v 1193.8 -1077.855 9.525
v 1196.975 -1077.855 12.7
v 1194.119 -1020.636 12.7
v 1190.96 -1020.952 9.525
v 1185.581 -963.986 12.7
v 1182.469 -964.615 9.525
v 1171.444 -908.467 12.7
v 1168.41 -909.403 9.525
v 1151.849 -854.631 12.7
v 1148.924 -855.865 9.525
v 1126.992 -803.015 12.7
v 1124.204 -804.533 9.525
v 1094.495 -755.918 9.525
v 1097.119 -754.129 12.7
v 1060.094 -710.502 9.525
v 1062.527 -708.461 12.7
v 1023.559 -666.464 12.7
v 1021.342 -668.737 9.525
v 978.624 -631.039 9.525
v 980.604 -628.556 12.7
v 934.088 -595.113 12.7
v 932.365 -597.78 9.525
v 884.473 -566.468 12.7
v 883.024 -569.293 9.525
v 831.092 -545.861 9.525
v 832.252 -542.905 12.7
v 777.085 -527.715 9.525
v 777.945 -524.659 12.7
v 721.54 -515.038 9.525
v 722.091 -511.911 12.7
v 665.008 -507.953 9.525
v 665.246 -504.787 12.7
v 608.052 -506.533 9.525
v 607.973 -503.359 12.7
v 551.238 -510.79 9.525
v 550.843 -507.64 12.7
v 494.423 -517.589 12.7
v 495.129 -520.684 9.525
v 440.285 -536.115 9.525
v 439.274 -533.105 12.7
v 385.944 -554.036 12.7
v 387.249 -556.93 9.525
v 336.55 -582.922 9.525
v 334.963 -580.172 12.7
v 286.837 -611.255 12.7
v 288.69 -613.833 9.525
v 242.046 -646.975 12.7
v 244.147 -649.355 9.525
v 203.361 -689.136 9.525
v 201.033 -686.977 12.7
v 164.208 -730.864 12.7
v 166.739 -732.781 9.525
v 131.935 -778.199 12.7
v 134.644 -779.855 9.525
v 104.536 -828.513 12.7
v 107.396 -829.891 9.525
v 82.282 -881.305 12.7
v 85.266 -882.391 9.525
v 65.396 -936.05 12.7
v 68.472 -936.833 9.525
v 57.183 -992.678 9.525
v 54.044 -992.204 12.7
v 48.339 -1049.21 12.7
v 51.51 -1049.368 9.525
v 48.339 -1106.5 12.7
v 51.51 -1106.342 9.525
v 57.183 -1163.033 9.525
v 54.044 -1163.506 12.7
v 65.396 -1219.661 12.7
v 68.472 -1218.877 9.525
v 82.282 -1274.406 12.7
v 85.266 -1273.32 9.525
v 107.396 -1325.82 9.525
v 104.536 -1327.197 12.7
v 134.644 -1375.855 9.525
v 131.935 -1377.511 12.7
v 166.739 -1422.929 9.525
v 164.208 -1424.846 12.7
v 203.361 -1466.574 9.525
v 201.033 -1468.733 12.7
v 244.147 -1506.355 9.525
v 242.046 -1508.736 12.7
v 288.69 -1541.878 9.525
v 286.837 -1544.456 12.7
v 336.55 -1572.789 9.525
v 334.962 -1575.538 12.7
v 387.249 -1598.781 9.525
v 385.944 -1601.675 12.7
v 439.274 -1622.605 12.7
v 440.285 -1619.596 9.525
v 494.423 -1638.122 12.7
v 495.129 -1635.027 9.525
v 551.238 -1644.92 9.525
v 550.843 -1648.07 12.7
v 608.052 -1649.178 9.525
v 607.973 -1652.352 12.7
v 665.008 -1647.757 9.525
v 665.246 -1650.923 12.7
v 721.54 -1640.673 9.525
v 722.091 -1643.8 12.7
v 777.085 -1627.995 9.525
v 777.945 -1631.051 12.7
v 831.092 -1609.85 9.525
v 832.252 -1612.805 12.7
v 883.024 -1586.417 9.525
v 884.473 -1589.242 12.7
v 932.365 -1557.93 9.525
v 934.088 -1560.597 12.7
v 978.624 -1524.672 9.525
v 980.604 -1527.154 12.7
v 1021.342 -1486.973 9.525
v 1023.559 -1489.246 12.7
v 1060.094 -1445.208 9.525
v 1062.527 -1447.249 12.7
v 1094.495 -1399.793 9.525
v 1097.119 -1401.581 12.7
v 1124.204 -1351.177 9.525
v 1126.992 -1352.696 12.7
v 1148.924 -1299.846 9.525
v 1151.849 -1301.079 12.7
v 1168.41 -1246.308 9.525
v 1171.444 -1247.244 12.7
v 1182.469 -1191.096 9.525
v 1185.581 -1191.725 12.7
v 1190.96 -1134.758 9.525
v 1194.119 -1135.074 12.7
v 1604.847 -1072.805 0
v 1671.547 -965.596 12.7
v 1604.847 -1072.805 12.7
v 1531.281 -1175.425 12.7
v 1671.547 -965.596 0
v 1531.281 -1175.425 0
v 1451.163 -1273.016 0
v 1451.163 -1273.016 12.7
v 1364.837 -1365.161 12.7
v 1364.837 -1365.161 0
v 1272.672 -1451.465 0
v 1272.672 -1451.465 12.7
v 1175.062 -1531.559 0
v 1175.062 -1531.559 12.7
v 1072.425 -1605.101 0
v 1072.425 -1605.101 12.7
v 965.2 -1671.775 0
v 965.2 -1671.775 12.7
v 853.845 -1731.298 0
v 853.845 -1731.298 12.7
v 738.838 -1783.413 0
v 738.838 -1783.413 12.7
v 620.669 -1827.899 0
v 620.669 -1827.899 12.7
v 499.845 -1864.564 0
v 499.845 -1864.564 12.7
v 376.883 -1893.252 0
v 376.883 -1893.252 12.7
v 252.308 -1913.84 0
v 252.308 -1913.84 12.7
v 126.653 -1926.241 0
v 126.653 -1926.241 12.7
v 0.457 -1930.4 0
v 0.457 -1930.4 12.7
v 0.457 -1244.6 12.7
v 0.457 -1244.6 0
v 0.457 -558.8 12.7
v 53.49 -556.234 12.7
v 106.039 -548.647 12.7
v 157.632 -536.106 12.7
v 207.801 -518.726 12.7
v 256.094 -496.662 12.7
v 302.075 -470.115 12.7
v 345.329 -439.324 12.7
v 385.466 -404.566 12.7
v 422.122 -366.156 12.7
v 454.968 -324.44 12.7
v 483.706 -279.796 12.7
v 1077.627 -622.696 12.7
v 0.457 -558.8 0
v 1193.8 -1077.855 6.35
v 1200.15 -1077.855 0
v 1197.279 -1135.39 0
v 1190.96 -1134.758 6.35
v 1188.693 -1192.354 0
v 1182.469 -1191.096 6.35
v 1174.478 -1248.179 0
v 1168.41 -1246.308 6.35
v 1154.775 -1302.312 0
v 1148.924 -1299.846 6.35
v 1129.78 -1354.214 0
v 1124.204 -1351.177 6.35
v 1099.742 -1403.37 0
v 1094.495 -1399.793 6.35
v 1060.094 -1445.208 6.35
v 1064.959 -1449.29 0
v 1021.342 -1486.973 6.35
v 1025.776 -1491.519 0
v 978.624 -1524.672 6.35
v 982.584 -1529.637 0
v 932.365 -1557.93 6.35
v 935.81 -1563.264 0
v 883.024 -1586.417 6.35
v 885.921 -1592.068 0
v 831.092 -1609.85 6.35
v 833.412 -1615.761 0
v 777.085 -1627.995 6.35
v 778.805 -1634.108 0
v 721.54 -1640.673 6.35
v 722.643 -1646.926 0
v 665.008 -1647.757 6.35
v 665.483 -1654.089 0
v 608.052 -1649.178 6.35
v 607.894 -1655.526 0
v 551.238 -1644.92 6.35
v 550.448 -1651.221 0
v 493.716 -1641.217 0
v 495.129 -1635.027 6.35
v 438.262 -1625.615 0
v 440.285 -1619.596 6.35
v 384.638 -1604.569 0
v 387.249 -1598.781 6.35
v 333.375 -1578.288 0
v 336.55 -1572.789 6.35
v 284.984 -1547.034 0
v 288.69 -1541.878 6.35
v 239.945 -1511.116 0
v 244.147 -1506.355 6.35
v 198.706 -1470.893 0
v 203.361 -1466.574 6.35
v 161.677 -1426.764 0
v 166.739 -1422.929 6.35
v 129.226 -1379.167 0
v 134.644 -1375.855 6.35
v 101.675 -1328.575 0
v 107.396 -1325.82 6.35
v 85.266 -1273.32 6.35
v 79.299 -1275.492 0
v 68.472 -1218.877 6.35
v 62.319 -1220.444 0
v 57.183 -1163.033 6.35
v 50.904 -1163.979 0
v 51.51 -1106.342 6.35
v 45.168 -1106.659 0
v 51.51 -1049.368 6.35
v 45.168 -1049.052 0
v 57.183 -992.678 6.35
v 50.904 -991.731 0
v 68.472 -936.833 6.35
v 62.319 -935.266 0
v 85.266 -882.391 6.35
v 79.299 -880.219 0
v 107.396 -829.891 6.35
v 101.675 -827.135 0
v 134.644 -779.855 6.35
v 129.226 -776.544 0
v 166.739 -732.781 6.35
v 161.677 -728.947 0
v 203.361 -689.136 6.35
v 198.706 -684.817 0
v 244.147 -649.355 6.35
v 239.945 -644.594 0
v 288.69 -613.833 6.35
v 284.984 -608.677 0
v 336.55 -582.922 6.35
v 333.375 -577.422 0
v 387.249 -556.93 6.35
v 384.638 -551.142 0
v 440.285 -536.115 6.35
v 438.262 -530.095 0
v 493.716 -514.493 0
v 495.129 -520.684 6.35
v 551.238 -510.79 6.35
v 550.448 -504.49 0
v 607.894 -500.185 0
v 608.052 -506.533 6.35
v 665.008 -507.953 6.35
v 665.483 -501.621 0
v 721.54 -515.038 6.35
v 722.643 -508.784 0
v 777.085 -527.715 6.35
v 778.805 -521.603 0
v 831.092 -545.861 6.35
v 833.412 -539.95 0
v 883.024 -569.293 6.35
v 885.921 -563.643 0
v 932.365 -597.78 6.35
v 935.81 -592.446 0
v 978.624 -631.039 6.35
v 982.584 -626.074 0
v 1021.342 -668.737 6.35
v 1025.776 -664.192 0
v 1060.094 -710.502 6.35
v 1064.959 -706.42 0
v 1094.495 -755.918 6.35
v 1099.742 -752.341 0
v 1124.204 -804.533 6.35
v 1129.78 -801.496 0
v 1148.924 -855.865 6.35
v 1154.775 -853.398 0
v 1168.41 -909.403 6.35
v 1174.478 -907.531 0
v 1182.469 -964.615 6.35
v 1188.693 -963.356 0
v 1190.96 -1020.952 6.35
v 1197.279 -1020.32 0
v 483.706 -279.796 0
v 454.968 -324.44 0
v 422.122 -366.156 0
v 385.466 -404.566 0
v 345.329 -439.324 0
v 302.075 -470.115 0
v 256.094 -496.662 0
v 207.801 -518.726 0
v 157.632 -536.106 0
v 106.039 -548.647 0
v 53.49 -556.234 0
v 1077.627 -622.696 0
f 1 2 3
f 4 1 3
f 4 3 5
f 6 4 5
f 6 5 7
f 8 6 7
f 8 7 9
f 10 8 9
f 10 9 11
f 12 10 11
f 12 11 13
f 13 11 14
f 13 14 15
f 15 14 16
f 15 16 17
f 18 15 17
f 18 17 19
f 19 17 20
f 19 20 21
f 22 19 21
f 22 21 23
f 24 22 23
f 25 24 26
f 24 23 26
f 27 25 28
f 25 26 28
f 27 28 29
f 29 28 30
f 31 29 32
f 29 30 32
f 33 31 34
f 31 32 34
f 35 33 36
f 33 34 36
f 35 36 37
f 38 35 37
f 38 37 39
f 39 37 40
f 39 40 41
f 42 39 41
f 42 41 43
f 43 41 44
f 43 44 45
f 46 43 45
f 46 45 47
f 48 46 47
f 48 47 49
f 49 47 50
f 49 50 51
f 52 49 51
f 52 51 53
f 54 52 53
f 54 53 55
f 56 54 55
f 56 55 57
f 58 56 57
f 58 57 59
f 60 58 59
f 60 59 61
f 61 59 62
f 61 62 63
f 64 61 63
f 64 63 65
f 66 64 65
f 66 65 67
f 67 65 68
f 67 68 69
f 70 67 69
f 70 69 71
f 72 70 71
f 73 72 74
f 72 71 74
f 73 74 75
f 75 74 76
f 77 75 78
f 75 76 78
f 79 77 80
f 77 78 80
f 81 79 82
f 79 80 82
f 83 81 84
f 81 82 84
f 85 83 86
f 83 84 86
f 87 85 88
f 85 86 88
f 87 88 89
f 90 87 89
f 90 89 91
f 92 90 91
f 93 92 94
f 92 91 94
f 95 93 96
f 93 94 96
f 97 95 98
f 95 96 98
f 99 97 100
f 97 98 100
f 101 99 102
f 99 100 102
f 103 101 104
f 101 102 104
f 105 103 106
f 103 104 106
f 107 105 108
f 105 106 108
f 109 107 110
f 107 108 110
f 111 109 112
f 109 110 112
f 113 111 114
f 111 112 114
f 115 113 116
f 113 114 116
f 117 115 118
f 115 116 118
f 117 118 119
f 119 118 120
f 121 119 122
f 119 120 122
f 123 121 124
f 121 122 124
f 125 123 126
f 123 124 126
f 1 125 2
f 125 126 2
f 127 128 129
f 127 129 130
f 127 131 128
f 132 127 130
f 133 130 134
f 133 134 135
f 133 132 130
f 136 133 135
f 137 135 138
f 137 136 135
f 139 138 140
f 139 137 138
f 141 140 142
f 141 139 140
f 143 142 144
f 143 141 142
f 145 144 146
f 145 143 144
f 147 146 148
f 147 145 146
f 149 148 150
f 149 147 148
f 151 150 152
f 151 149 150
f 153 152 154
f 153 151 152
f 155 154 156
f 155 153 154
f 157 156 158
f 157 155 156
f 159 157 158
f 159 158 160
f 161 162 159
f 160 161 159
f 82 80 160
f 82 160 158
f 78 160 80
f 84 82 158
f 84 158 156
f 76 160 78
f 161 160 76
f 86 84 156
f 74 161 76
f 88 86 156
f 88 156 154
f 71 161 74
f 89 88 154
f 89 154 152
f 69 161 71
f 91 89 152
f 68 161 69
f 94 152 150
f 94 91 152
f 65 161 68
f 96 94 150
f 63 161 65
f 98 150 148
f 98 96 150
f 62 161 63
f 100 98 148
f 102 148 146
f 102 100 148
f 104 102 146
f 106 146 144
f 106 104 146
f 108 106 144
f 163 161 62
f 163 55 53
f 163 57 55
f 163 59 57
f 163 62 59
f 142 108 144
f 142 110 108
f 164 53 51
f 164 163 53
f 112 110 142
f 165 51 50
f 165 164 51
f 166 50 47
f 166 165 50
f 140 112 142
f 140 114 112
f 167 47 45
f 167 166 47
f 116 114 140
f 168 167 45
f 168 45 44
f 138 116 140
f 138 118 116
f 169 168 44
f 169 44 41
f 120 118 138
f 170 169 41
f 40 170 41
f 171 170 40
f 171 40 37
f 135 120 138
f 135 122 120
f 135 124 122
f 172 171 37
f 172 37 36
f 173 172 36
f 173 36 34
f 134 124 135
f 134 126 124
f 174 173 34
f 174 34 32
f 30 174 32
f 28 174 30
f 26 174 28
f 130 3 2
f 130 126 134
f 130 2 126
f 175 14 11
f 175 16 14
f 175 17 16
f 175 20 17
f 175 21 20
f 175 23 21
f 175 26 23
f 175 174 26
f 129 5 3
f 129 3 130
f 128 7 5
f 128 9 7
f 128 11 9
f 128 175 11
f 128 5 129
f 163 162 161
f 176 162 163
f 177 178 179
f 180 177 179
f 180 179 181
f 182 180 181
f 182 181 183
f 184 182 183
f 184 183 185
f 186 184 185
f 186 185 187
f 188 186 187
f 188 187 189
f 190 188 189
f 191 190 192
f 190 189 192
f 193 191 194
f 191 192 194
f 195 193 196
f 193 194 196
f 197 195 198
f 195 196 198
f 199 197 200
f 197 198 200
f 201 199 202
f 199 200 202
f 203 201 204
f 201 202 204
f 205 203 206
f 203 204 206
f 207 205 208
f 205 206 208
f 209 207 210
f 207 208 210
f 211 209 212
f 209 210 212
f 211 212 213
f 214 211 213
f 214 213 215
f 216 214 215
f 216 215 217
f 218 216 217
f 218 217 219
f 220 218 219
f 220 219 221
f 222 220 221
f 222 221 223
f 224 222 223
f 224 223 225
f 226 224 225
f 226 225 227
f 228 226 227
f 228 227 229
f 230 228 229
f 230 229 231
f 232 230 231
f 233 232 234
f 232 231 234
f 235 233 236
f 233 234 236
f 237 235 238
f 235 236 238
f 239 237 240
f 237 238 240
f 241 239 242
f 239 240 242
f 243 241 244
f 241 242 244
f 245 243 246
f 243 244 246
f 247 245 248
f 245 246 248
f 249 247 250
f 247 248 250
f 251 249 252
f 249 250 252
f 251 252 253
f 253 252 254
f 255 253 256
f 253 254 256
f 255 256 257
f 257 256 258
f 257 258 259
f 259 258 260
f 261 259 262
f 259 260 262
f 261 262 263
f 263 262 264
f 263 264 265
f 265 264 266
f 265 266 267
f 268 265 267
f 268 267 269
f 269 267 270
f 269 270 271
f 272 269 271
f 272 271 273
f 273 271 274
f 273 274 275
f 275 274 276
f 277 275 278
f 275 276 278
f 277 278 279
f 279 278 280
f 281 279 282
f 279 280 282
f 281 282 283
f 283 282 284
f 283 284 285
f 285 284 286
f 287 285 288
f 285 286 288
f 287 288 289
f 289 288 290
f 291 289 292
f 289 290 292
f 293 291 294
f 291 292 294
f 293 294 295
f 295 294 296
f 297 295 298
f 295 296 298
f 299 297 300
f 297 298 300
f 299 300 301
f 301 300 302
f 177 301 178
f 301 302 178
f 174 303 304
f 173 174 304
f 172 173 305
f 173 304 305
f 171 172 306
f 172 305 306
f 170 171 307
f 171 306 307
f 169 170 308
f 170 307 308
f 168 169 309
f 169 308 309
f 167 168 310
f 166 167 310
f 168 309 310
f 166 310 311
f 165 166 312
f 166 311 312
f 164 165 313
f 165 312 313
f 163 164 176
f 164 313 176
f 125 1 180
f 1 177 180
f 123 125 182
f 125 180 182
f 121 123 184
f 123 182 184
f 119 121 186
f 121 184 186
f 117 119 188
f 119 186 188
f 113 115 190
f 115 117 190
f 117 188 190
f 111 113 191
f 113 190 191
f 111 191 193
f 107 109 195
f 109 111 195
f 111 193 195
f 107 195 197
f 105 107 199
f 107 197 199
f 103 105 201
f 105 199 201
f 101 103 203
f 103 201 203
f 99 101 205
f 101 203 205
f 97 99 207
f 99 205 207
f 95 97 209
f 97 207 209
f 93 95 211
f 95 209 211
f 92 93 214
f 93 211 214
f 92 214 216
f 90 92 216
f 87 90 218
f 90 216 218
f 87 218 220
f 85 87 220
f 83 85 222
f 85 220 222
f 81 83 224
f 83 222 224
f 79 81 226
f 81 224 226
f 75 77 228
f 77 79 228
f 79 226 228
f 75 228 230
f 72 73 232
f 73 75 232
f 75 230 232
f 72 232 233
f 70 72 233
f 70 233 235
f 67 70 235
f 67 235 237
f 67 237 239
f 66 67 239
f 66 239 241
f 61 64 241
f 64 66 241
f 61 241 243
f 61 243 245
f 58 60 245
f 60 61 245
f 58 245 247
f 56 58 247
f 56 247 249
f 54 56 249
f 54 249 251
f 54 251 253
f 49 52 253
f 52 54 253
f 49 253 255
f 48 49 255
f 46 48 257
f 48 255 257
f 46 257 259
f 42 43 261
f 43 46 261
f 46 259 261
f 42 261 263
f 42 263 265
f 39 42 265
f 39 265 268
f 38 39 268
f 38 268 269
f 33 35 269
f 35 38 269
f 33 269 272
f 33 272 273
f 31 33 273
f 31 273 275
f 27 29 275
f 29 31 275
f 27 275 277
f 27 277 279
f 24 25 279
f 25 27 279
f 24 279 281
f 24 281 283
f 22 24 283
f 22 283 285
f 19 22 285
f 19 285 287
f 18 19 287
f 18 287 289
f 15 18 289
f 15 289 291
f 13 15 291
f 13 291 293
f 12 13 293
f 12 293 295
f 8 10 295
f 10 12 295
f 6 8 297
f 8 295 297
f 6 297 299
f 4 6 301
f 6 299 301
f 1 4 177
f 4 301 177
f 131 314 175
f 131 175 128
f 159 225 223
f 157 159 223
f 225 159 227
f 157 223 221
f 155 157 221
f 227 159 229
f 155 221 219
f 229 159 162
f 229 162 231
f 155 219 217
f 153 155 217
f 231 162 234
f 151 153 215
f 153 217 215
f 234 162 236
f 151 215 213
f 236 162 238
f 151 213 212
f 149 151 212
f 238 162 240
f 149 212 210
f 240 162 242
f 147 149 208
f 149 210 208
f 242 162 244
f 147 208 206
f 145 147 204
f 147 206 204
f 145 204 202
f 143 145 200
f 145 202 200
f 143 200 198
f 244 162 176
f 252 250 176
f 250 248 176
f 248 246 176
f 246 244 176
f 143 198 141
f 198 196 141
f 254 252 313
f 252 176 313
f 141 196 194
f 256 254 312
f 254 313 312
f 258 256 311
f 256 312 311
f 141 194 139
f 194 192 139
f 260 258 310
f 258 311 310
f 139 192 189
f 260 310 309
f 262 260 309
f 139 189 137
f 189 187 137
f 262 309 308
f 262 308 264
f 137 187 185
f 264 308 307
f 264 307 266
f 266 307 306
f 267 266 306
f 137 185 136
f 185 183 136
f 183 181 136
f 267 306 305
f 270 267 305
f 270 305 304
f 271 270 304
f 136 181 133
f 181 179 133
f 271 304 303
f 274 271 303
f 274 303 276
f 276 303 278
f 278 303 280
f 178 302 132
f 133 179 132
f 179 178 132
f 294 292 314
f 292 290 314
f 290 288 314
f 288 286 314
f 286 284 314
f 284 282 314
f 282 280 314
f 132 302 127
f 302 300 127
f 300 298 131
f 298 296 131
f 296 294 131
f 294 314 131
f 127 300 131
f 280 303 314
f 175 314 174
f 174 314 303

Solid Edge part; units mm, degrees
sketch "Sketch1" plane through (0, 0, 0) normal (0, 0, 1) x (1, 0, 0)
  line L0 (1077.6266, -622.6959) -> (483.7062, -279.7959)
  line L1 (0.4572, -1244.6) -> (0.4572, -558.7998)
  line L2 (0.4572, -1244.6) -> (0.4572, -1930.3999)
  line L3 (1077.6266, -622.6959) -> (1671.5468, -965.5959)
  arc A0 (483.7062, -279.7959) -> (0.4572, -558.7998) centre (0, 0) cw
  arc A1 (1671.5468, -965.5959) -> (0.4572, -1930.3999) centre (0, 0) cw
  circle A2 centre (622.3, -1077.8552) radius 571.5
extrude "Protrusion1" add sketch "Sketch1" along normal blind 12.7
chamfer "Chamfer_1" distance 3.175 angle 45 1 edges at (50.8, -1077.8552, 12.7)
chamfer "Chamfer_2" distance 6.35 angle 45 1 edges at (50.8, -1077.8552, 0)
